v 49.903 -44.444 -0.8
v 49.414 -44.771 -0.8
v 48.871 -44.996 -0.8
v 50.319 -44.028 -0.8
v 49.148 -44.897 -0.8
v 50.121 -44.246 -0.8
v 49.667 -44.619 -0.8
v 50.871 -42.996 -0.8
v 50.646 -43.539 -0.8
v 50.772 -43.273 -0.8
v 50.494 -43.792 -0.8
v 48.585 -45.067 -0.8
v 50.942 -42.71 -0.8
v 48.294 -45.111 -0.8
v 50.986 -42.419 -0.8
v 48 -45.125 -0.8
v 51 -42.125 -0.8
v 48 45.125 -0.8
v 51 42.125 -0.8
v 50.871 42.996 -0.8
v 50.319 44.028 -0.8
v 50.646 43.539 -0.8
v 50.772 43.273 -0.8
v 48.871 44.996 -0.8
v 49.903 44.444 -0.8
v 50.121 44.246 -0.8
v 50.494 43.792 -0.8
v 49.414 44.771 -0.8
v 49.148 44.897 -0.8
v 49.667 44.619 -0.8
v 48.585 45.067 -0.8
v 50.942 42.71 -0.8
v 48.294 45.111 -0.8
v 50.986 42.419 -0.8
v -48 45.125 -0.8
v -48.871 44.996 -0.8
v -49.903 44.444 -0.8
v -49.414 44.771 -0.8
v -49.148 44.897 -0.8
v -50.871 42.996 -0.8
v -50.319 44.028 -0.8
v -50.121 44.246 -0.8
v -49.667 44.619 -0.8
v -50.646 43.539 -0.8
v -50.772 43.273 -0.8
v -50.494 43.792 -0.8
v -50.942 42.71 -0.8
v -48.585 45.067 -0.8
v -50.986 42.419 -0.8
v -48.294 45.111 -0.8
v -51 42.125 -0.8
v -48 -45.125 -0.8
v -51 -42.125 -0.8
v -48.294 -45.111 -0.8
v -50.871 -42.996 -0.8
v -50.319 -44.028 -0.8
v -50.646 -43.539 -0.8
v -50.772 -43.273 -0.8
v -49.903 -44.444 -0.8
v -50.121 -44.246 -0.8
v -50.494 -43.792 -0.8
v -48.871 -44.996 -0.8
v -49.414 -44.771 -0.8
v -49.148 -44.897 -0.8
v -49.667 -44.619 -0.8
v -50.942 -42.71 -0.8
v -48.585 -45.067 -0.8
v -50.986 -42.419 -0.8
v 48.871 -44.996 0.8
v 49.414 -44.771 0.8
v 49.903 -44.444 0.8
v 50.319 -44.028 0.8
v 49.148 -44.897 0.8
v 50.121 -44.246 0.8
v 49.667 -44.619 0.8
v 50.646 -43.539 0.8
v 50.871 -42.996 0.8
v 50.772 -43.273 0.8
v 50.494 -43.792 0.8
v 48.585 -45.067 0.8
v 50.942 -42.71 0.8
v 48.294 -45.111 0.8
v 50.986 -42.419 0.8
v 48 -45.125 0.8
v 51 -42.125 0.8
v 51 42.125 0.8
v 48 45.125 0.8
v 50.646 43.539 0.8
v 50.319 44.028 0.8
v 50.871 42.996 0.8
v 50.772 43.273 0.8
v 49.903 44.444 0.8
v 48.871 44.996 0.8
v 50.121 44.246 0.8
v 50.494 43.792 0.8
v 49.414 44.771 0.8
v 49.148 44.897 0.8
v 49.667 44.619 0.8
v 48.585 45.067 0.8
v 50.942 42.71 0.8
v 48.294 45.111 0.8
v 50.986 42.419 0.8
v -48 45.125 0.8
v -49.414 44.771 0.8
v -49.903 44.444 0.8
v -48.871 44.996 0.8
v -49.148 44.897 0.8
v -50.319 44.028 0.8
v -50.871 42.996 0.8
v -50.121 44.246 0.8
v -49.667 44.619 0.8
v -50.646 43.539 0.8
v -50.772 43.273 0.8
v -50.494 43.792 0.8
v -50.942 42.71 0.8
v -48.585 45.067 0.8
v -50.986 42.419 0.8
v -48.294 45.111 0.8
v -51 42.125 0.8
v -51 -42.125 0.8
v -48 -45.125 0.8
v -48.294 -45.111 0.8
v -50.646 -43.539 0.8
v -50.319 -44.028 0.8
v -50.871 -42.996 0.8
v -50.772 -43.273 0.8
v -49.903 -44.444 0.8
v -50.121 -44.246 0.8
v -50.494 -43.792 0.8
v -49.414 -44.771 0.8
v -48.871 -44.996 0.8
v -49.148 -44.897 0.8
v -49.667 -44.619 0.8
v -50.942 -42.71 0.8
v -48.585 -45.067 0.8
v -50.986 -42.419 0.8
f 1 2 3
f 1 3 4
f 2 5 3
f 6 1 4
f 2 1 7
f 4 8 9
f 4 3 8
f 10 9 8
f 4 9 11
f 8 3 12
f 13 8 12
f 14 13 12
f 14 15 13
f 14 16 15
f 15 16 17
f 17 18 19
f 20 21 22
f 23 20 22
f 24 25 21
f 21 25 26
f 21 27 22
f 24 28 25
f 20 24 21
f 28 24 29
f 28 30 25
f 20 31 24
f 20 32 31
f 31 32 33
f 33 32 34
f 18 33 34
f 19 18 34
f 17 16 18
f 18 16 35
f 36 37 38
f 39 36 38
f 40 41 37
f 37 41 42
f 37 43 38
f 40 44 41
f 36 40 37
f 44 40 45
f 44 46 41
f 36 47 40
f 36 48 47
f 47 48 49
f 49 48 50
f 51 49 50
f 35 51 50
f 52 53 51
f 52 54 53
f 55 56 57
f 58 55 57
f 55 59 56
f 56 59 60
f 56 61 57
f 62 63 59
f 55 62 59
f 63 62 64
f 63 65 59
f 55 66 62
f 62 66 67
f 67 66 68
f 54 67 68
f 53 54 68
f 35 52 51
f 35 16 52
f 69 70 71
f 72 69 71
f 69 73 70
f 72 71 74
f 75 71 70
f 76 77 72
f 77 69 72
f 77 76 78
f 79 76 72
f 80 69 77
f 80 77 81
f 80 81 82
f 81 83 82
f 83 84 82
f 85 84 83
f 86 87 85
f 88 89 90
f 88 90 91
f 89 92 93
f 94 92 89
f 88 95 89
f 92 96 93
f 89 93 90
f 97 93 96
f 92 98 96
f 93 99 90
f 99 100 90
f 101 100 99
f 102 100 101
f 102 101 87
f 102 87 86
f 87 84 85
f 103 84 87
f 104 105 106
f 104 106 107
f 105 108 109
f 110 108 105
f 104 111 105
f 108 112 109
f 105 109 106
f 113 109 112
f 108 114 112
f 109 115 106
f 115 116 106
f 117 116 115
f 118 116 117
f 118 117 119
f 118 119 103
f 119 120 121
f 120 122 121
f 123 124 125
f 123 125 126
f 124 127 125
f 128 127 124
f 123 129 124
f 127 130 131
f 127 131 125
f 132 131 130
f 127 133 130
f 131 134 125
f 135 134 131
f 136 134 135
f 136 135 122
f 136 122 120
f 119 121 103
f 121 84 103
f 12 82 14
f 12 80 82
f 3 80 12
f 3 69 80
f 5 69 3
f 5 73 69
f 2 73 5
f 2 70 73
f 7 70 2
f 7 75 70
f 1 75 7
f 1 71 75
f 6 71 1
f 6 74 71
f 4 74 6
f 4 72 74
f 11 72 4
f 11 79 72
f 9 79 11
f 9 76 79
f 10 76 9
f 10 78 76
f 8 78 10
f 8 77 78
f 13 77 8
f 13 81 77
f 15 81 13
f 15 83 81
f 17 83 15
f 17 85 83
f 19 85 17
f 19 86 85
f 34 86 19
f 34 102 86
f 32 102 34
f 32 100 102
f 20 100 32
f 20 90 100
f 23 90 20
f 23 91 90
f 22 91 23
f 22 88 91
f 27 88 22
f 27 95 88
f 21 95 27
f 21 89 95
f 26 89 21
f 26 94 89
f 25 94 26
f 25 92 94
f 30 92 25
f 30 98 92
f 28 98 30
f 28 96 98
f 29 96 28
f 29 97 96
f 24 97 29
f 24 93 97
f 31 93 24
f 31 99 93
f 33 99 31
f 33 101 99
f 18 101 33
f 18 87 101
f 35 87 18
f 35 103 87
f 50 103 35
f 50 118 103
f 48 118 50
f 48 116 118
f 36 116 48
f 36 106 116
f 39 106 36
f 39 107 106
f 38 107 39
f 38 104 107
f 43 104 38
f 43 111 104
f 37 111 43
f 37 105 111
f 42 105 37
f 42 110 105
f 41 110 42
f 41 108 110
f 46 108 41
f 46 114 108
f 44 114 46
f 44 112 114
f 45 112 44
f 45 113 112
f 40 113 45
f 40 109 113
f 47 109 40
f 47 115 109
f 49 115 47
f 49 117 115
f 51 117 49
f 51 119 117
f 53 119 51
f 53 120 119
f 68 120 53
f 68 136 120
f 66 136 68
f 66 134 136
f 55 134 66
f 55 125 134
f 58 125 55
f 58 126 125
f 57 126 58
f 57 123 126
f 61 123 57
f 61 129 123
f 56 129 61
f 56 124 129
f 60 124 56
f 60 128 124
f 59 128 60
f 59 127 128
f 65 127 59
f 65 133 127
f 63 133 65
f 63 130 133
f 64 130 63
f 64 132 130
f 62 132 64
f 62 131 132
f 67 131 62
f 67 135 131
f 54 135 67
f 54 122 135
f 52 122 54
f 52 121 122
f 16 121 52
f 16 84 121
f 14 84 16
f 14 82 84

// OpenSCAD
$fn=64;

module pcb_board(length=102.0, width=90.25, thickness=1.6, corner_r=3.0) {
    linear_extrude(height=thickness, center=true)
        offset(r=corner_r)
            square([length-2*corner_r, width-2*corner_r], center=true);
}

pcb_board();
